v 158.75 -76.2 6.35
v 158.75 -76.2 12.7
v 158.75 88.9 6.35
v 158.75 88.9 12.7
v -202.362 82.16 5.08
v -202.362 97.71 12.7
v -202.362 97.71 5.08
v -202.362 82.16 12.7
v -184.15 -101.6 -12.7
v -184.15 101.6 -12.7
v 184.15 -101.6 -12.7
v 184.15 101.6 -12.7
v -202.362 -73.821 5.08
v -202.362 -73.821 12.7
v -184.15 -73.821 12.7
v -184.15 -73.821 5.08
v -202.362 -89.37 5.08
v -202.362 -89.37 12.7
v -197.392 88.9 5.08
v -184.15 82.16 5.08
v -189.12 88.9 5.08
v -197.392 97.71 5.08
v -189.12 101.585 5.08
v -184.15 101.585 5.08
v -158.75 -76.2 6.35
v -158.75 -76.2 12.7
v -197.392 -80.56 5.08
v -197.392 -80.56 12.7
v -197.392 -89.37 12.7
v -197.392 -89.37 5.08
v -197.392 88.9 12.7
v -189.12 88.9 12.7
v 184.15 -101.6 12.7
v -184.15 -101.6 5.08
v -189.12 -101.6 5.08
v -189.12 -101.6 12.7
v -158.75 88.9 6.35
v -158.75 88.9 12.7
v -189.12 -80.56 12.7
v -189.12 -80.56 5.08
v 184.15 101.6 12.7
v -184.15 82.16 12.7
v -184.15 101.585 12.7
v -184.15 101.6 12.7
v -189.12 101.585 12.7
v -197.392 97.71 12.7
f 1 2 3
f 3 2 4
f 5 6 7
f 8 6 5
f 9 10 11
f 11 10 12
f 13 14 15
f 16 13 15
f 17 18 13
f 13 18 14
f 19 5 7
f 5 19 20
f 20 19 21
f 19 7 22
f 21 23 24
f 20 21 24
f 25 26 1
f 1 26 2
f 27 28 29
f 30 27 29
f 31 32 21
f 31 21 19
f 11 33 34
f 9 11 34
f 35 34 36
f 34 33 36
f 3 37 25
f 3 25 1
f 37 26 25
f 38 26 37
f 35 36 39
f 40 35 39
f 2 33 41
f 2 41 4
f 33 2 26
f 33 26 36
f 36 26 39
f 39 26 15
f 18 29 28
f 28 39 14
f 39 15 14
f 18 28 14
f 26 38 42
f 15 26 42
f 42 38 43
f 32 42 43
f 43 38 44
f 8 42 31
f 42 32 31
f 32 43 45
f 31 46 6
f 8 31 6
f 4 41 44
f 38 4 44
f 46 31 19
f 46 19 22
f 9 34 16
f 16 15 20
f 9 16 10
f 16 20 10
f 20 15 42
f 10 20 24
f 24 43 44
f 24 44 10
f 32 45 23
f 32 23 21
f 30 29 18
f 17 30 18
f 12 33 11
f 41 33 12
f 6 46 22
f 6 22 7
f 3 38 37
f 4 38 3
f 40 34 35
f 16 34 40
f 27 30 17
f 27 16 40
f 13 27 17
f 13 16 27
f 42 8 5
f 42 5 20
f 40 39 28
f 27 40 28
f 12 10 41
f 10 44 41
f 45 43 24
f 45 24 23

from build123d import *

# Parameters (mm, degrees)
SKETCH1_W           = 368.3
SKETCH1_H           = 203.2
BOSS_EXTRUDE1_DEPTH = 12.7
SKETCH2_W           = 317.5
SKETCH2_H           = 165.1
CUT_EXTRUDE1_DEPTH  = 6.35
BOSS_EXTRUDE3_DEPTH = 7.62
CUT_EXTRUDE2_DEPTH  = 20.32


with BuildPart() as part:
    # Sketch1 → Boss-Extrude1 (new, symmetric)
    with BuildSketch(Plane.XY):
        Rectangle(SKETCH1_W, SKETCH1_H)
    extrude(amount=BOSS_EXTRUDE1_DEPTH, both=True)

    # Sketch2 → Cut-Extrude1 (cut)
    with BuildSketch(Plane.XY.offset(12.7)):
        with Locations((0, 6.35)):
            Rectangle(SKETCH2_W, SKETCH2_H)
    extrude(amount=-CUT_EXTRUDE1_DEPTH, mode=Mode.SUBTRACT)

    # Sketch4 → Boss-Extrude3 (add)
    with BuildSketch(Plane.XY.offset(12.7)):
        Polygon((184.15, -101.6), (189.119700693, -101.6), (189.119700693, -80.560215749), (197.392455233, -80.560215749), (197.392455233, -89.3698935), (202.362155926, -89.3698935), (202.362155926, -73.820655617), (184.15, -73.820655617), align=None)
        Polygon((189.119700693, 88.9), (197.392455233, 88.9), (197.392455233, 97.709677751), (202.362155926, 97.709677751), (202.362155926, 82.160439868), (184.15, 82.160439868), (184.15, 88.012590692), (184.15, 101.584884773), (189.119700693, 101.584884773), align=None)
    boss_extrude3 = extrude(amount=-BOSS_EXTRUDE3_DEPTH)

    # Mirror2: Boss-Extrude3 across plane
    add(boss_extrude3.mirror(Plane(origin=(0, 0, 0), x_dir=(0, 0, 1), z_dir=(1, 0, 0))))

    # Sketch5 → Cut-Extrude2 (cut)
    with BuildSketch(Plane.XY.offset(12.7)):
        Polygon((202.362155926, -73.820655617), (184.15, -73.820655617), (184.15, -101.6), (189.119700693, -101.6), (189.119700693, -80.560215749), (197.392455233, -80.560215749), (197.392455233, -89.3698935), (202.362155926, -89.3698935), align=None)
        Polygon((184.15, 101.584884773), (184.15, 82.160439868), (202.362155926, 82.160439868), (202.362155926, 97.709677751), (197.392455233, 97.709677751), (197.392455233, 88.9), (189.119700693, 88.9), (189.119700693, 101.584884773), align=None)
    extrude(amount=-CUT_EXTRUDE2_DEPTH, mode=Mode.SUBTRACT)


solid = part.part
